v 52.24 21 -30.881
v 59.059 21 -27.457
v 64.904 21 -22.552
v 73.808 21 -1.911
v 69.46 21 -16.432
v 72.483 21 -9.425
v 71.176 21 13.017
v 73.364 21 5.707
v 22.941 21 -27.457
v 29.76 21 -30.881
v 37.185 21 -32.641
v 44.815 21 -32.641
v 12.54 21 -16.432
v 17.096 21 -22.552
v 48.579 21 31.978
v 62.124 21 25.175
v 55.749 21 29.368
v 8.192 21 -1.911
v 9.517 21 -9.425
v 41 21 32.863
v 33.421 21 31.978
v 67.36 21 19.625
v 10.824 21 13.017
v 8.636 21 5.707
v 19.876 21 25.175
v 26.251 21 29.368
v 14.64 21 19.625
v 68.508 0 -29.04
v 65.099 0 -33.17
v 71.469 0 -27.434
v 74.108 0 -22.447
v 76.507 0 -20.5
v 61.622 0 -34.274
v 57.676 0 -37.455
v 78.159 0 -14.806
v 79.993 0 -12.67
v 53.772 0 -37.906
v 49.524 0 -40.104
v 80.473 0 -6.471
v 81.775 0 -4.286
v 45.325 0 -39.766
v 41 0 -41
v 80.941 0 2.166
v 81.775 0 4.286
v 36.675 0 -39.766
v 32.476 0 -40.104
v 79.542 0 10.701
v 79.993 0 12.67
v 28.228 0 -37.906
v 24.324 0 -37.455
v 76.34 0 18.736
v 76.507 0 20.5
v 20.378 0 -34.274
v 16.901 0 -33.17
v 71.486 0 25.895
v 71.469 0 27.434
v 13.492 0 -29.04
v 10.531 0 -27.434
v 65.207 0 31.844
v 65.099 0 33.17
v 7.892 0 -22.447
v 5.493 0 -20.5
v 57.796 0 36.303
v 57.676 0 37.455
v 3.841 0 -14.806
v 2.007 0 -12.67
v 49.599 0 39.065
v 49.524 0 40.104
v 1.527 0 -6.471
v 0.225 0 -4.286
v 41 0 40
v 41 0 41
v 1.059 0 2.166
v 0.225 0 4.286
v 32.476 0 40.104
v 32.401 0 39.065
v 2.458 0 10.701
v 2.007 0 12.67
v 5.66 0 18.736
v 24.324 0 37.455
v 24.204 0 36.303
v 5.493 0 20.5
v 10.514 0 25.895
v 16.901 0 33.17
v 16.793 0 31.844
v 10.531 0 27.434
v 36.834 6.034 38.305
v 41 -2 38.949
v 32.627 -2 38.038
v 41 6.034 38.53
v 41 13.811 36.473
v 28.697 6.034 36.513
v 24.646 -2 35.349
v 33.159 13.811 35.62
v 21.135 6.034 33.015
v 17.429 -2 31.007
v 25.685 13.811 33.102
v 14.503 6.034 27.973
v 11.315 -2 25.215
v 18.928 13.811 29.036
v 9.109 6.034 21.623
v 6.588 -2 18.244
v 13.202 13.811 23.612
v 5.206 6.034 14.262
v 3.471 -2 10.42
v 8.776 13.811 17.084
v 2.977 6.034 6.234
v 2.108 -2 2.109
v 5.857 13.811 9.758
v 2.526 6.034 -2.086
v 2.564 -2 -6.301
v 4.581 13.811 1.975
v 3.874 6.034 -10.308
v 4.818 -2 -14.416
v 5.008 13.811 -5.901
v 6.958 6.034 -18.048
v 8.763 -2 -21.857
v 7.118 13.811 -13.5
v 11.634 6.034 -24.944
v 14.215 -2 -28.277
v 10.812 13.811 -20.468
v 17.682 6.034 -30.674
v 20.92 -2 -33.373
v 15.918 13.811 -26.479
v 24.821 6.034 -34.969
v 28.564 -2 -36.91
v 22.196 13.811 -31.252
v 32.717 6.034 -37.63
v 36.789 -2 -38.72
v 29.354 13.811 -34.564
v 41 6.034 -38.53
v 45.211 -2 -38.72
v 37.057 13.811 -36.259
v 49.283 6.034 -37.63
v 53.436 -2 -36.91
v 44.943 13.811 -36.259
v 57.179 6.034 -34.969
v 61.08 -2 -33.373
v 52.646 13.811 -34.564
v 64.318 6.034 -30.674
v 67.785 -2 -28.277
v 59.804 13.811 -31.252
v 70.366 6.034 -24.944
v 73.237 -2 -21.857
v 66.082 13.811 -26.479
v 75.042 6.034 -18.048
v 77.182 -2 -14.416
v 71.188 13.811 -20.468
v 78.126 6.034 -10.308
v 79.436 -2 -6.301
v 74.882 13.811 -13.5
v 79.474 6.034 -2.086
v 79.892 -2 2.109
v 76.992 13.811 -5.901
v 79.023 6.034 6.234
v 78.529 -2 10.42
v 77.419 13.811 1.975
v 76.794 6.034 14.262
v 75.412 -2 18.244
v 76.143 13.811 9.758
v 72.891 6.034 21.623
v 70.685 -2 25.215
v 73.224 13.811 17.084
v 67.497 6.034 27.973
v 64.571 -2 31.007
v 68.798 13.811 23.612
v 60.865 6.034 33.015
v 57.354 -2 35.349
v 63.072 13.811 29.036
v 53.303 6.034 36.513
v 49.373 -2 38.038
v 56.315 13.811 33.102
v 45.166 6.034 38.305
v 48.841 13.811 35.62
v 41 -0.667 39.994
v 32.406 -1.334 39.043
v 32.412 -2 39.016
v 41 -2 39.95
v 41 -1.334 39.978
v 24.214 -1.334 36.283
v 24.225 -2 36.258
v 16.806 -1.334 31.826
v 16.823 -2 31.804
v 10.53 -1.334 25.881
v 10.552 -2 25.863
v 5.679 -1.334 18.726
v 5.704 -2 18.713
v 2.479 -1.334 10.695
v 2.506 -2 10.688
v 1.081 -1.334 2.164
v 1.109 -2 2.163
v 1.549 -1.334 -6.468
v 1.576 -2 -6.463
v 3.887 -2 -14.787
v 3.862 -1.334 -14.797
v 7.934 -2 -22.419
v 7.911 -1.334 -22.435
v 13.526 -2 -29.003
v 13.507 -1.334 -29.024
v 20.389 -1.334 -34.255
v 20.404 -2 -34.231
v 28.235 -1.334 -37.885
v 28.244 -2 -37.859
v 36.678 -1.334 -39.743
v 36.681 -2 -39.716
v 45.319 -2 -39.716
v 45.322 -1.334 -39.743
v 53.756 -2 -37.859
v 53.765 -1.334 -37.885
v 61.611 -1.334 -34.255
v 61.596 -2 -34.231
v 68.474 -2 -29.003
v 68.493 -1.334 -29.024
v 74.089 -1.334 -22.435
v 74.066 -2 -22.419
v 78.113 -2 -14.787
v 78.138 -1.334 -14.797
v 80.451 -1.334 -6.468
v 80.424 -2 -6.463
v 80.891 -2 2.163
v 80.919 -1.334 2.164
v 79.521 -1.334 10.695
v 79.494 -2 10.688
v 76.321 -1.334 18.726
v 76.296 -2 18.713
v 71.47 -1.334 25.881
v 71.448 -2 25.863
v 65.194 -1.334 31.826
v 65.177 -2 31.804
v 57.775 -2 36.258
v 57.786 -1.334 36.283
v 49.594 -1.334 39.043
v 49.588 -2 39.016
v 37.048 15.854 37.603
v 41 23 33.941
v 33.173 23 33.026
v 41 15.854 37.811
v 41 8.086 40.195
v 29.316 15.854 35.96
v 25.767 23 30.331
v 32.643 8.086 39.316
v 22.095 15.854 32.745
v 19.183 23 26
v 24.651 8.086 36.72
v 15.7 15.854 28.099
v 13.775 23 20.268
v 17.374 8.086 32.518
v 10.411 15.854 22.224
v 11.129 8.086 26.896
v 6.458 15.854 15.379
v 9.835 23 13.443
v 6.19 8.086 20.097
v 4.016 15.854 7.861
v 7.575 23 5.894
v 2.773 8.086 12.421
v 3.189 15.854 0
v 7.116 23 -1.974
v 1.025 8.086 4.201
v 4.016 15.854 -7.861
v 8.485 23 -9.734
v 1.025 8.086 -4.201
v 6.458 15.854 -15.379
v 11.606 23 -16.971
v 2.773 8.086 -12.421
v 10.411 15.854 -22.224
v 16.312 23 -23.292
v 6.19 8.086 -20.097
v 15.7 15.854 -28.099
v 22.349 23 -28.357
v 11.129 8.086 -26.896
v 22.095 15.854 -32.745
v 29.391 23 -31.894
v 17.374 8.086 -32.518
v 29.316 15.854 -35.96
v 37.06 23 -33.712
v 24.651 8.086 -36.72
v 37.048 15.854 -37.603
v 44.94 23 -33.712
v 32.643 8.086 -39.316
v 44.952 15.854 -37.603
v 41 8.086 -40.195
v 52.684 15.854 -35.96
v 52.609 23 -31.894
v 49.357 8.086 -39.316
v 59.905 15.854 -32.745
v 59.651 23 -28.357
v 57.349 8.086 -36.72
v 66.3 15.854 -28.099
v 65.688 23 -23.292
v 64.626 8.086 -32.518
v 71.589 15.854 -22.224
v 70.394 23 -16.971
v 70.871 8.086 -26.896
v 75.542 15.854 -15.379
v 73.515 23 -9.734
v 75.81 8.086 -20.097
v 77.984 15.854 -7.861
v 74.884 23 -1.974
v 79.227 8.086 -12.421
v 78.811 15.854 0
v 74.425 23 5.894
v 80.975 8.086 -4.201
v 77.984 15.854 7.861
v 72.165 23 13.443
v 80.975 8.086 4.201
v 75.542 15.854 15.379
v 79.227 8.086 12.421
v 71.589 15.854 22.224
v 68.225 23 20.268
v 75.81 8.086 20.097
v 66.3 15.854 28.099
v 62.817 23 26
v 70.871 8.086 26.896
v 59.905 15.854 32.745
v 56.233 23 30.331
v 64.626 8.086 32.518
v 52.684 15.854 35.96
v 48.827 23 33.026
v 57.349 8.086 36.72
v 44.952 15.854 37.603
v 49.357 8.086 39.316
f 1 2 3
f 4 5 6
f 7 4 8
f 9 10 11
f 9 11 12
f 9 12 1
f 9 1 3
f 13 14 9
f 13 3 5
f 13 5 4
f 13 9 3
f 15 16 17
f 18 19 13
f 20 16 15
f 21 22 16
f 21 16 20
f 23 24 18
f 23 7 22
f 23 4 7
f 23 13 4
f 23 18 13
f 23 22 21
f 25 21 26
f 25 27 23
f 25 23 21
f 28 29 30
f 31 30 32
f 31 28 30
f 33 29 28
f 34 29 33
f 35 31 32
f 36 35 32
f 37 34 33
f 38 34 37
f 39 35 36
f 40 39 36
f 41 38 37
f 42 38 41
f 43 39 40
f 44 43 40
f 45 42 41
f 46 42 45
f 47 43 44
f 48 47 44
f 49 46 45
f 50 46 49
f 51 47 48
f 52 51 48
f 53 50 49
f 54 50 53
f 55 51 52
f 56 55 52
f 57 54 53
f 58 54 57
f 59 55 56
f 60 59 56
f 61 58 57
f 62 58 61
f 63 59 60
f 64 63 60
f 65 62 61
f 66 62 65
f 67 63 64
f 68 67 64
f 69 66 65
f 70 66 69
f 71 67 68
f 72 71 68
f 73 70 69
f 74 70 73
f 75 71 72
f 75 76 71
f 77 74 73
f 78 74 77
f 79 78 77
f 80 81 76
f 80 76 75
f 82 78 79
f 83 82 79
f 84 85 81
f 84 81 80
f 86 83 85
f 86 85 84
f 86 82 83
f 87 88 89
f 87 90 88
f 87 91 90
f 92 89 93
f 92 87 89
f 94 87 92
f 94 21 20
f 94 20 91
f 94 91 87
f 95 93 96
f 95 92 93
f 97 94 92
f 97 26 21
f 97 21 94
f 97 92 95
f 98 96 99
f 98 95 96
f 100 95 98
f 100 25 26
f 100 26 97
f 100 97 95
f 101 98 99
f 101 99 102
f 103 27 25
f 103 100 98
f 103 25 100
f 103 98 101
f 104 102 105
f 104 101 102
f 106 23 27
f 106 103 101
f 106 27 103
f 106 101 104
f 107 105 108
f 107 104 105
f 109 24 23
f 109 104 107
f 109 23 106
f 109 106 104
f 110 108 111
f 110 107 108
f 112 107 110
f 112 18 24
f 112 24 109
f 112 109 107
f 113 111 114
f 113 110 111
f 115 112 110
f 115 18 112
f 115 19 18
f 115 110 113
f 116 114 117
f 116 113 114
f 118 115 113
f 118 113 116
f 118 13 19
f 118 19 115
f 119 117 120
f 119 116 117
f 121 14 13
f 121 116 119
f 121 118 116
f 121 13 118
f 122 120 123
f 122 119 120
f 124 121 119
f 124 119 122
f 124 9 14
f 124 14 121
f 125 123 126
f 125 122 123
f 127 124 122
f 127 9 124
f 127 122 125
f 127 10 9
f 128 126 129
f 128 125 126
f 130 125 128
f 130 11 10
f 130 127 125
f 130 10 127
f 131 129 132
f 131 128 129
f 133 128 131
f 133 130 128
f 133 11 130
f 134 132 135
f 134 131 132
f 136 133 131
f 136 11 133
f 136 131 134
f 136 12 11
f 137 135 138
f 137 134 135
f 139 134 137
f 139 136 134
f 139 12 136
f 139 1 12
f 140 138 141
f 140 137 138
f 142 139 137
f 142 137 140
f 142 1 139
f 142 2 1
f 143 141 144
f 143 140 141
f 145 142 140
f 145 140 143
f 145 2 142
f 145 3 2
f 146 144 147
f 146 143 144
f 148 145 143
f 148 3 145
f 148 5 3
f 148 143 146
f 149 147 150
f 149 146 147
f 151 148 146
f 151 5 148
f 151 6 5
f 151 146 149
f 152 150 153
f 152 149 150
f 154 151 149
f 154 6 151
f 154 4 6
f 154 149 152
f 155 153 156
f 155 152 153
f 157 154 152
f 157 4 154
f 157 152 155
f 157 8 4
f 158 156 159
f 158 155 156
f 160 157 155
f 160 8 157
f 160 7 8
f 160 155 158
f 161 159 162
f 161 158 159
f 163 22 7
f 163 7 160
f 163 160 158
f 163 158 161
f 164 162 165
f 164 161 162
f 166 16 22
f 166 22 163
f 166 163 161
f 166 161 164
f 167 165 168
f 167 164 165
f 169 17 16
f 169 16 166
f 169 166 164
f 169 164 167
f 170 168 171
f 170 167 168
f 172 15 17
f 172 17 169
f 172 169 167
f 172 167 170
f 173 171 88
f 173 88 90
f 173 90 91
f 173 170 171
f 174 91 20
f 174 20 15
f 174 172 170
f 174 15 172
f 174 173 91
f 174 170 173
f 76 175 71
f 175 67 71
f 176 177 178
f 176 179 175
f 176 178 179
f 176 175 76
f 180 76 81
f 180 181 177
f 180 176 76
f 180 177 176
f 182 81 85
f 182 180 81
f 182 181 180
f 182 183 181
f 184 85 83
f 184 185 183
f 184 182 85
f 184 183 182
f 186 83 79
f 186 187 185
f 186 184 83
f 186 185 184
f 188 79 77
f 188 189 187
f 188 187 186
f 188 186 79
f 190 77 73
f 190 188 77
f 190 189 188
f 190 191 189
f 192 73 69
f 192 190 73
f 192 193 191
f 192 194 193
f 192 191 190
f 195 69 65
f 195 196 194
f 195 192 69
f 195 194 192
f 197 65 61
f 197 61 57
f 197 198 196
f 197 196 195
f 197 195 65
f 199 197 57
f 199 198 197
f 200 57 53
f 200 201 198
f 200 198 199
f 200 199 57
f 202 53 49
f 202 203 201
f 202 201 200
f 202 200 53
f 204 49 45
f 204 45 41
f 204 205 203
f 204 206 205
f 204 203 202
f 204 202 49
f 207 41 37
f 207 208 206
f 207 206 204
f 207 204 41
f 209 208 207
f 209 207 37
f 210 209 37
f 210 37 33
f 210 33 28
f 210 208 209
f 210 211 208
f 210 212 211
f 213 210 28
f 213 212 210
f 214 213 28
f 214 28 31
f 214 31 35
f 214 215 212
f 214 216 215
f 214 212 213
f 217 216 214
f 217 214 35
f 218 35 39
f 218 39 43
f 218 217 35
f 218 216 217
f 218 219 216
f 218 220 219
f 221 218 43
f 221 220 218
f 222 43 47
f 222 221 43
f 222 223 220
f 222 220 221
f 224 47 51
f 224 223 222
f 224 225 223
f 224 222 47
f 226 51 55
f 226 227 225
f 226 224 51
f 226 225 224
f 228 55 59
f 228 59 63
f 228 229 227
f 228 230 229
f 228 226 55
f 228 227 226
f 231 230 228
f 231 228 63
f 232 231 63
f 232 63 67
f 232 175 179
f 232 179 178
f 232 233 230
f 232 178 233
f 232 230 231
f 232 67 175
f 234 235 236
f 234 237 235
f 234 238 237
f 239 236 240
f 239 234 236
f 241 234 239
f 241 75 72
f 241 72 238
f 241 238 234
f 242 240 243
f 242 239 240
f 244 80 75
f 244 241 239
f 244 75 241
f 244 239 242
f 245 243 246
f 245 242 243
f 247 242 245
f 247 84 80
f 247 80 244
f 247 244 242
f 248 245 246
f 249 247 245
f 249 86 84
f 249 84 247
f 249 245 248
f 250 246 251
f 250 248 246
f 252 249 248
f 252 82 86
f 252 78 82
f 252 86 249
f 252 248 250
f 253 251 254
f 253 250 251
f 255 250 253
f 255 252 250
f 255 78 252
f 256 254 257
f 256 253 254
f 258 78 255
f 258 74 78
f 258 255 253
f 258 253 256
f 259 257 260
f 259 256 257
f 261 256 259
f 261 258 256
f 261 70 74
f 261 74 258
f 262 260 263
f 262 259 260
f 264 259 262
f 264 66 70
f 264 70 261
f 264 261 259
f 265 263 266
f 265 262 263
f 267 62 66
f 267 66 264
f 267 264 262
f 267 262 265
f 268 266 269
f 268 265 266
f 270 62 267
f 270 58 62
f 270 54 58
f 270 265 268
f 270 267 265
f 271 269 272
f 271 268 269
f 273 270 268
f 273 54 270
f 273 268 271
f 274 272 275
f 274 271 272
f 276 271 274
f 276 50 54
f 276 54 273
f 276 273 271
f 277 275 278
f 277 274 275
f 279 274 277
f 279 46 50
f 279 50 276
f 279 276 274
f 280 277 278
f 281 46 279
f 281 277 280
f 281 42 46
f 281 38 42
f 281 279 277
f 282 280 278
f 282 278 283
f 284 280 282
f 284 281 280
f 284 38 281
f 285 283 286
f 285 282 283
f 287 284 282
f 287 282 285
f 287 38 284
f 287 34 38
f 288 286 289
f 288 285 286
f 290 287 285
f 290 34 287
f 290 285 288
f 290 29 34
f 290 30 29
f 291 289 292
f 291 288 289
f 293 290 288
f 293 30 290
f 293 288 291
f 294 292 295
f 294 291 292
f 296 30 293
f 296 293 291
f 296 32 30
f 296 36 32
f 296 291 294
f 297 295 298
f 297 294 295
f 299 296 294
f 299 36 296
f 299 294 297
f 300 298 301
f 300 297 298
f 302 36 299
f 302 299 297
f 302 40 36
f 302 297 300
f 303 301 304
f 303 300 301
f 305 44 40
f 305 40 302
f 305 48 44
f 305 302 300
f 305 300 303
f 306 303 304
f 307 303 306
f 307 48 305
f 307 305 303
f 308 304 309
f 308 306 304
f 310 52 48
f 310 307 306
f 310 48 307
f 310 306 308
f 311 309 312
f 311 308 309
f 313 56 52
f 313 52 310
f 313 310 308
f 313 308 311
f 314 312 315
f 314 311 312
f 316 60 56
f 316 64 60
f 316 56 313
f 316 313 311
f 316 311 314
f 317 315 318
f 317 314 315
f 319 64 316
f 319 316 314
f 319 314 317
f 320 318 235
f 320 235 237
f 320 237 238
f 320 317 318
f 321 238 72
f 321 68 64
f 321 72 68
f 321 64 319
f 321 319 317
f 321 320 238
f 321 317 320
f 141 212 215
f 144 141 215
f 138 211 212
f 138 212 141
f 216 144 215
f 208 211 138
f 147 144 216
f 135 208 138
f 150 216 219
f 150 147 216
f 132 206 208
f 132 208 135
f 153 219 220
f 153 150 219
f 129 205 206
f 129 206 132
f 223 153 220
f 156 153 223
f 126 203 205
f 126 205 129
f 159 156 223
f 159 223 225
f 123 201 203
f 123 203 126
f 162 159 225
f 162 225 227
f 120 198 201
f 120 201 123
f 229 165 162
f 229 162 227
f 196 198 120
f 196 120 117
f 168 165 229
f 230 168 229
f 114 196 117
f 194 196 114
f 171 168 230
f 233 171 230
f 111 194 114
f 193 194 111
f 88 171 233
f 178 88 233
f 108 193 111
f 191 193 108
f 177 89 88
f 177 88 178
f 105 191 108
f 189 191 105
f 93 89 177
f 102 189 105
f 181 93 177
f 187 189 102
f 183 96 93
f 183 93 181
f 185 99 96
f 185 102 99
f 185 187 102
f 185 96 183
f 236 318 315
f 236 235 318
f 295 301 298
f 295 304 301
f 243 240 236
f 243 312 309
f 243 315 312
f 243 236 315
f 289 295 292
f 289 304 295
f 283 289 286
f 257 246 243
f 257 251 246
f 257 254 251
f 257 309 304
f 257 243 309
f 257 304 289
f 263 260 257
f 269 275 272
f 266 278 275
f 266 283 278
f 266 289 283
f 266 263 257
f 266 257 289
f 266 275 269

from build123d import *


with BuildPart() as part:
    # Sketch1 → Revolve3 (revolve)
    with BuildSketch(Plane.XY, mode=Mode.PRIVATE) as revolve3_sk:
        with BuildLine():
            Line((0, 0), (1, 0))
            ThreePointArc((1, 0), (1.012509778, -1.000312842), (1.050031289, -2))
            Line((1.050031289, -2), (2.051315812, -2))
            ThreePointArc((2.051315812, -2), (3.297318564, 9.975360272), (8.13664655, 21))
            Line((8.13664655, 21), (41, 21))
            Line((41, 21), (41, 23))
            Line((41, 23), (7.058874503, 23))
            ThreePointArc((7.058874503, 23), (1.804425343, 12.029419243), (0, 0))
        make_face()
    revolve(revolve3_sk.sketch.rotate(Axis((41, 23, 0), (0, -1, 0)), 270), axis=Axis((41, 23, 0), (0, -1, 0)))


solid = part.part
